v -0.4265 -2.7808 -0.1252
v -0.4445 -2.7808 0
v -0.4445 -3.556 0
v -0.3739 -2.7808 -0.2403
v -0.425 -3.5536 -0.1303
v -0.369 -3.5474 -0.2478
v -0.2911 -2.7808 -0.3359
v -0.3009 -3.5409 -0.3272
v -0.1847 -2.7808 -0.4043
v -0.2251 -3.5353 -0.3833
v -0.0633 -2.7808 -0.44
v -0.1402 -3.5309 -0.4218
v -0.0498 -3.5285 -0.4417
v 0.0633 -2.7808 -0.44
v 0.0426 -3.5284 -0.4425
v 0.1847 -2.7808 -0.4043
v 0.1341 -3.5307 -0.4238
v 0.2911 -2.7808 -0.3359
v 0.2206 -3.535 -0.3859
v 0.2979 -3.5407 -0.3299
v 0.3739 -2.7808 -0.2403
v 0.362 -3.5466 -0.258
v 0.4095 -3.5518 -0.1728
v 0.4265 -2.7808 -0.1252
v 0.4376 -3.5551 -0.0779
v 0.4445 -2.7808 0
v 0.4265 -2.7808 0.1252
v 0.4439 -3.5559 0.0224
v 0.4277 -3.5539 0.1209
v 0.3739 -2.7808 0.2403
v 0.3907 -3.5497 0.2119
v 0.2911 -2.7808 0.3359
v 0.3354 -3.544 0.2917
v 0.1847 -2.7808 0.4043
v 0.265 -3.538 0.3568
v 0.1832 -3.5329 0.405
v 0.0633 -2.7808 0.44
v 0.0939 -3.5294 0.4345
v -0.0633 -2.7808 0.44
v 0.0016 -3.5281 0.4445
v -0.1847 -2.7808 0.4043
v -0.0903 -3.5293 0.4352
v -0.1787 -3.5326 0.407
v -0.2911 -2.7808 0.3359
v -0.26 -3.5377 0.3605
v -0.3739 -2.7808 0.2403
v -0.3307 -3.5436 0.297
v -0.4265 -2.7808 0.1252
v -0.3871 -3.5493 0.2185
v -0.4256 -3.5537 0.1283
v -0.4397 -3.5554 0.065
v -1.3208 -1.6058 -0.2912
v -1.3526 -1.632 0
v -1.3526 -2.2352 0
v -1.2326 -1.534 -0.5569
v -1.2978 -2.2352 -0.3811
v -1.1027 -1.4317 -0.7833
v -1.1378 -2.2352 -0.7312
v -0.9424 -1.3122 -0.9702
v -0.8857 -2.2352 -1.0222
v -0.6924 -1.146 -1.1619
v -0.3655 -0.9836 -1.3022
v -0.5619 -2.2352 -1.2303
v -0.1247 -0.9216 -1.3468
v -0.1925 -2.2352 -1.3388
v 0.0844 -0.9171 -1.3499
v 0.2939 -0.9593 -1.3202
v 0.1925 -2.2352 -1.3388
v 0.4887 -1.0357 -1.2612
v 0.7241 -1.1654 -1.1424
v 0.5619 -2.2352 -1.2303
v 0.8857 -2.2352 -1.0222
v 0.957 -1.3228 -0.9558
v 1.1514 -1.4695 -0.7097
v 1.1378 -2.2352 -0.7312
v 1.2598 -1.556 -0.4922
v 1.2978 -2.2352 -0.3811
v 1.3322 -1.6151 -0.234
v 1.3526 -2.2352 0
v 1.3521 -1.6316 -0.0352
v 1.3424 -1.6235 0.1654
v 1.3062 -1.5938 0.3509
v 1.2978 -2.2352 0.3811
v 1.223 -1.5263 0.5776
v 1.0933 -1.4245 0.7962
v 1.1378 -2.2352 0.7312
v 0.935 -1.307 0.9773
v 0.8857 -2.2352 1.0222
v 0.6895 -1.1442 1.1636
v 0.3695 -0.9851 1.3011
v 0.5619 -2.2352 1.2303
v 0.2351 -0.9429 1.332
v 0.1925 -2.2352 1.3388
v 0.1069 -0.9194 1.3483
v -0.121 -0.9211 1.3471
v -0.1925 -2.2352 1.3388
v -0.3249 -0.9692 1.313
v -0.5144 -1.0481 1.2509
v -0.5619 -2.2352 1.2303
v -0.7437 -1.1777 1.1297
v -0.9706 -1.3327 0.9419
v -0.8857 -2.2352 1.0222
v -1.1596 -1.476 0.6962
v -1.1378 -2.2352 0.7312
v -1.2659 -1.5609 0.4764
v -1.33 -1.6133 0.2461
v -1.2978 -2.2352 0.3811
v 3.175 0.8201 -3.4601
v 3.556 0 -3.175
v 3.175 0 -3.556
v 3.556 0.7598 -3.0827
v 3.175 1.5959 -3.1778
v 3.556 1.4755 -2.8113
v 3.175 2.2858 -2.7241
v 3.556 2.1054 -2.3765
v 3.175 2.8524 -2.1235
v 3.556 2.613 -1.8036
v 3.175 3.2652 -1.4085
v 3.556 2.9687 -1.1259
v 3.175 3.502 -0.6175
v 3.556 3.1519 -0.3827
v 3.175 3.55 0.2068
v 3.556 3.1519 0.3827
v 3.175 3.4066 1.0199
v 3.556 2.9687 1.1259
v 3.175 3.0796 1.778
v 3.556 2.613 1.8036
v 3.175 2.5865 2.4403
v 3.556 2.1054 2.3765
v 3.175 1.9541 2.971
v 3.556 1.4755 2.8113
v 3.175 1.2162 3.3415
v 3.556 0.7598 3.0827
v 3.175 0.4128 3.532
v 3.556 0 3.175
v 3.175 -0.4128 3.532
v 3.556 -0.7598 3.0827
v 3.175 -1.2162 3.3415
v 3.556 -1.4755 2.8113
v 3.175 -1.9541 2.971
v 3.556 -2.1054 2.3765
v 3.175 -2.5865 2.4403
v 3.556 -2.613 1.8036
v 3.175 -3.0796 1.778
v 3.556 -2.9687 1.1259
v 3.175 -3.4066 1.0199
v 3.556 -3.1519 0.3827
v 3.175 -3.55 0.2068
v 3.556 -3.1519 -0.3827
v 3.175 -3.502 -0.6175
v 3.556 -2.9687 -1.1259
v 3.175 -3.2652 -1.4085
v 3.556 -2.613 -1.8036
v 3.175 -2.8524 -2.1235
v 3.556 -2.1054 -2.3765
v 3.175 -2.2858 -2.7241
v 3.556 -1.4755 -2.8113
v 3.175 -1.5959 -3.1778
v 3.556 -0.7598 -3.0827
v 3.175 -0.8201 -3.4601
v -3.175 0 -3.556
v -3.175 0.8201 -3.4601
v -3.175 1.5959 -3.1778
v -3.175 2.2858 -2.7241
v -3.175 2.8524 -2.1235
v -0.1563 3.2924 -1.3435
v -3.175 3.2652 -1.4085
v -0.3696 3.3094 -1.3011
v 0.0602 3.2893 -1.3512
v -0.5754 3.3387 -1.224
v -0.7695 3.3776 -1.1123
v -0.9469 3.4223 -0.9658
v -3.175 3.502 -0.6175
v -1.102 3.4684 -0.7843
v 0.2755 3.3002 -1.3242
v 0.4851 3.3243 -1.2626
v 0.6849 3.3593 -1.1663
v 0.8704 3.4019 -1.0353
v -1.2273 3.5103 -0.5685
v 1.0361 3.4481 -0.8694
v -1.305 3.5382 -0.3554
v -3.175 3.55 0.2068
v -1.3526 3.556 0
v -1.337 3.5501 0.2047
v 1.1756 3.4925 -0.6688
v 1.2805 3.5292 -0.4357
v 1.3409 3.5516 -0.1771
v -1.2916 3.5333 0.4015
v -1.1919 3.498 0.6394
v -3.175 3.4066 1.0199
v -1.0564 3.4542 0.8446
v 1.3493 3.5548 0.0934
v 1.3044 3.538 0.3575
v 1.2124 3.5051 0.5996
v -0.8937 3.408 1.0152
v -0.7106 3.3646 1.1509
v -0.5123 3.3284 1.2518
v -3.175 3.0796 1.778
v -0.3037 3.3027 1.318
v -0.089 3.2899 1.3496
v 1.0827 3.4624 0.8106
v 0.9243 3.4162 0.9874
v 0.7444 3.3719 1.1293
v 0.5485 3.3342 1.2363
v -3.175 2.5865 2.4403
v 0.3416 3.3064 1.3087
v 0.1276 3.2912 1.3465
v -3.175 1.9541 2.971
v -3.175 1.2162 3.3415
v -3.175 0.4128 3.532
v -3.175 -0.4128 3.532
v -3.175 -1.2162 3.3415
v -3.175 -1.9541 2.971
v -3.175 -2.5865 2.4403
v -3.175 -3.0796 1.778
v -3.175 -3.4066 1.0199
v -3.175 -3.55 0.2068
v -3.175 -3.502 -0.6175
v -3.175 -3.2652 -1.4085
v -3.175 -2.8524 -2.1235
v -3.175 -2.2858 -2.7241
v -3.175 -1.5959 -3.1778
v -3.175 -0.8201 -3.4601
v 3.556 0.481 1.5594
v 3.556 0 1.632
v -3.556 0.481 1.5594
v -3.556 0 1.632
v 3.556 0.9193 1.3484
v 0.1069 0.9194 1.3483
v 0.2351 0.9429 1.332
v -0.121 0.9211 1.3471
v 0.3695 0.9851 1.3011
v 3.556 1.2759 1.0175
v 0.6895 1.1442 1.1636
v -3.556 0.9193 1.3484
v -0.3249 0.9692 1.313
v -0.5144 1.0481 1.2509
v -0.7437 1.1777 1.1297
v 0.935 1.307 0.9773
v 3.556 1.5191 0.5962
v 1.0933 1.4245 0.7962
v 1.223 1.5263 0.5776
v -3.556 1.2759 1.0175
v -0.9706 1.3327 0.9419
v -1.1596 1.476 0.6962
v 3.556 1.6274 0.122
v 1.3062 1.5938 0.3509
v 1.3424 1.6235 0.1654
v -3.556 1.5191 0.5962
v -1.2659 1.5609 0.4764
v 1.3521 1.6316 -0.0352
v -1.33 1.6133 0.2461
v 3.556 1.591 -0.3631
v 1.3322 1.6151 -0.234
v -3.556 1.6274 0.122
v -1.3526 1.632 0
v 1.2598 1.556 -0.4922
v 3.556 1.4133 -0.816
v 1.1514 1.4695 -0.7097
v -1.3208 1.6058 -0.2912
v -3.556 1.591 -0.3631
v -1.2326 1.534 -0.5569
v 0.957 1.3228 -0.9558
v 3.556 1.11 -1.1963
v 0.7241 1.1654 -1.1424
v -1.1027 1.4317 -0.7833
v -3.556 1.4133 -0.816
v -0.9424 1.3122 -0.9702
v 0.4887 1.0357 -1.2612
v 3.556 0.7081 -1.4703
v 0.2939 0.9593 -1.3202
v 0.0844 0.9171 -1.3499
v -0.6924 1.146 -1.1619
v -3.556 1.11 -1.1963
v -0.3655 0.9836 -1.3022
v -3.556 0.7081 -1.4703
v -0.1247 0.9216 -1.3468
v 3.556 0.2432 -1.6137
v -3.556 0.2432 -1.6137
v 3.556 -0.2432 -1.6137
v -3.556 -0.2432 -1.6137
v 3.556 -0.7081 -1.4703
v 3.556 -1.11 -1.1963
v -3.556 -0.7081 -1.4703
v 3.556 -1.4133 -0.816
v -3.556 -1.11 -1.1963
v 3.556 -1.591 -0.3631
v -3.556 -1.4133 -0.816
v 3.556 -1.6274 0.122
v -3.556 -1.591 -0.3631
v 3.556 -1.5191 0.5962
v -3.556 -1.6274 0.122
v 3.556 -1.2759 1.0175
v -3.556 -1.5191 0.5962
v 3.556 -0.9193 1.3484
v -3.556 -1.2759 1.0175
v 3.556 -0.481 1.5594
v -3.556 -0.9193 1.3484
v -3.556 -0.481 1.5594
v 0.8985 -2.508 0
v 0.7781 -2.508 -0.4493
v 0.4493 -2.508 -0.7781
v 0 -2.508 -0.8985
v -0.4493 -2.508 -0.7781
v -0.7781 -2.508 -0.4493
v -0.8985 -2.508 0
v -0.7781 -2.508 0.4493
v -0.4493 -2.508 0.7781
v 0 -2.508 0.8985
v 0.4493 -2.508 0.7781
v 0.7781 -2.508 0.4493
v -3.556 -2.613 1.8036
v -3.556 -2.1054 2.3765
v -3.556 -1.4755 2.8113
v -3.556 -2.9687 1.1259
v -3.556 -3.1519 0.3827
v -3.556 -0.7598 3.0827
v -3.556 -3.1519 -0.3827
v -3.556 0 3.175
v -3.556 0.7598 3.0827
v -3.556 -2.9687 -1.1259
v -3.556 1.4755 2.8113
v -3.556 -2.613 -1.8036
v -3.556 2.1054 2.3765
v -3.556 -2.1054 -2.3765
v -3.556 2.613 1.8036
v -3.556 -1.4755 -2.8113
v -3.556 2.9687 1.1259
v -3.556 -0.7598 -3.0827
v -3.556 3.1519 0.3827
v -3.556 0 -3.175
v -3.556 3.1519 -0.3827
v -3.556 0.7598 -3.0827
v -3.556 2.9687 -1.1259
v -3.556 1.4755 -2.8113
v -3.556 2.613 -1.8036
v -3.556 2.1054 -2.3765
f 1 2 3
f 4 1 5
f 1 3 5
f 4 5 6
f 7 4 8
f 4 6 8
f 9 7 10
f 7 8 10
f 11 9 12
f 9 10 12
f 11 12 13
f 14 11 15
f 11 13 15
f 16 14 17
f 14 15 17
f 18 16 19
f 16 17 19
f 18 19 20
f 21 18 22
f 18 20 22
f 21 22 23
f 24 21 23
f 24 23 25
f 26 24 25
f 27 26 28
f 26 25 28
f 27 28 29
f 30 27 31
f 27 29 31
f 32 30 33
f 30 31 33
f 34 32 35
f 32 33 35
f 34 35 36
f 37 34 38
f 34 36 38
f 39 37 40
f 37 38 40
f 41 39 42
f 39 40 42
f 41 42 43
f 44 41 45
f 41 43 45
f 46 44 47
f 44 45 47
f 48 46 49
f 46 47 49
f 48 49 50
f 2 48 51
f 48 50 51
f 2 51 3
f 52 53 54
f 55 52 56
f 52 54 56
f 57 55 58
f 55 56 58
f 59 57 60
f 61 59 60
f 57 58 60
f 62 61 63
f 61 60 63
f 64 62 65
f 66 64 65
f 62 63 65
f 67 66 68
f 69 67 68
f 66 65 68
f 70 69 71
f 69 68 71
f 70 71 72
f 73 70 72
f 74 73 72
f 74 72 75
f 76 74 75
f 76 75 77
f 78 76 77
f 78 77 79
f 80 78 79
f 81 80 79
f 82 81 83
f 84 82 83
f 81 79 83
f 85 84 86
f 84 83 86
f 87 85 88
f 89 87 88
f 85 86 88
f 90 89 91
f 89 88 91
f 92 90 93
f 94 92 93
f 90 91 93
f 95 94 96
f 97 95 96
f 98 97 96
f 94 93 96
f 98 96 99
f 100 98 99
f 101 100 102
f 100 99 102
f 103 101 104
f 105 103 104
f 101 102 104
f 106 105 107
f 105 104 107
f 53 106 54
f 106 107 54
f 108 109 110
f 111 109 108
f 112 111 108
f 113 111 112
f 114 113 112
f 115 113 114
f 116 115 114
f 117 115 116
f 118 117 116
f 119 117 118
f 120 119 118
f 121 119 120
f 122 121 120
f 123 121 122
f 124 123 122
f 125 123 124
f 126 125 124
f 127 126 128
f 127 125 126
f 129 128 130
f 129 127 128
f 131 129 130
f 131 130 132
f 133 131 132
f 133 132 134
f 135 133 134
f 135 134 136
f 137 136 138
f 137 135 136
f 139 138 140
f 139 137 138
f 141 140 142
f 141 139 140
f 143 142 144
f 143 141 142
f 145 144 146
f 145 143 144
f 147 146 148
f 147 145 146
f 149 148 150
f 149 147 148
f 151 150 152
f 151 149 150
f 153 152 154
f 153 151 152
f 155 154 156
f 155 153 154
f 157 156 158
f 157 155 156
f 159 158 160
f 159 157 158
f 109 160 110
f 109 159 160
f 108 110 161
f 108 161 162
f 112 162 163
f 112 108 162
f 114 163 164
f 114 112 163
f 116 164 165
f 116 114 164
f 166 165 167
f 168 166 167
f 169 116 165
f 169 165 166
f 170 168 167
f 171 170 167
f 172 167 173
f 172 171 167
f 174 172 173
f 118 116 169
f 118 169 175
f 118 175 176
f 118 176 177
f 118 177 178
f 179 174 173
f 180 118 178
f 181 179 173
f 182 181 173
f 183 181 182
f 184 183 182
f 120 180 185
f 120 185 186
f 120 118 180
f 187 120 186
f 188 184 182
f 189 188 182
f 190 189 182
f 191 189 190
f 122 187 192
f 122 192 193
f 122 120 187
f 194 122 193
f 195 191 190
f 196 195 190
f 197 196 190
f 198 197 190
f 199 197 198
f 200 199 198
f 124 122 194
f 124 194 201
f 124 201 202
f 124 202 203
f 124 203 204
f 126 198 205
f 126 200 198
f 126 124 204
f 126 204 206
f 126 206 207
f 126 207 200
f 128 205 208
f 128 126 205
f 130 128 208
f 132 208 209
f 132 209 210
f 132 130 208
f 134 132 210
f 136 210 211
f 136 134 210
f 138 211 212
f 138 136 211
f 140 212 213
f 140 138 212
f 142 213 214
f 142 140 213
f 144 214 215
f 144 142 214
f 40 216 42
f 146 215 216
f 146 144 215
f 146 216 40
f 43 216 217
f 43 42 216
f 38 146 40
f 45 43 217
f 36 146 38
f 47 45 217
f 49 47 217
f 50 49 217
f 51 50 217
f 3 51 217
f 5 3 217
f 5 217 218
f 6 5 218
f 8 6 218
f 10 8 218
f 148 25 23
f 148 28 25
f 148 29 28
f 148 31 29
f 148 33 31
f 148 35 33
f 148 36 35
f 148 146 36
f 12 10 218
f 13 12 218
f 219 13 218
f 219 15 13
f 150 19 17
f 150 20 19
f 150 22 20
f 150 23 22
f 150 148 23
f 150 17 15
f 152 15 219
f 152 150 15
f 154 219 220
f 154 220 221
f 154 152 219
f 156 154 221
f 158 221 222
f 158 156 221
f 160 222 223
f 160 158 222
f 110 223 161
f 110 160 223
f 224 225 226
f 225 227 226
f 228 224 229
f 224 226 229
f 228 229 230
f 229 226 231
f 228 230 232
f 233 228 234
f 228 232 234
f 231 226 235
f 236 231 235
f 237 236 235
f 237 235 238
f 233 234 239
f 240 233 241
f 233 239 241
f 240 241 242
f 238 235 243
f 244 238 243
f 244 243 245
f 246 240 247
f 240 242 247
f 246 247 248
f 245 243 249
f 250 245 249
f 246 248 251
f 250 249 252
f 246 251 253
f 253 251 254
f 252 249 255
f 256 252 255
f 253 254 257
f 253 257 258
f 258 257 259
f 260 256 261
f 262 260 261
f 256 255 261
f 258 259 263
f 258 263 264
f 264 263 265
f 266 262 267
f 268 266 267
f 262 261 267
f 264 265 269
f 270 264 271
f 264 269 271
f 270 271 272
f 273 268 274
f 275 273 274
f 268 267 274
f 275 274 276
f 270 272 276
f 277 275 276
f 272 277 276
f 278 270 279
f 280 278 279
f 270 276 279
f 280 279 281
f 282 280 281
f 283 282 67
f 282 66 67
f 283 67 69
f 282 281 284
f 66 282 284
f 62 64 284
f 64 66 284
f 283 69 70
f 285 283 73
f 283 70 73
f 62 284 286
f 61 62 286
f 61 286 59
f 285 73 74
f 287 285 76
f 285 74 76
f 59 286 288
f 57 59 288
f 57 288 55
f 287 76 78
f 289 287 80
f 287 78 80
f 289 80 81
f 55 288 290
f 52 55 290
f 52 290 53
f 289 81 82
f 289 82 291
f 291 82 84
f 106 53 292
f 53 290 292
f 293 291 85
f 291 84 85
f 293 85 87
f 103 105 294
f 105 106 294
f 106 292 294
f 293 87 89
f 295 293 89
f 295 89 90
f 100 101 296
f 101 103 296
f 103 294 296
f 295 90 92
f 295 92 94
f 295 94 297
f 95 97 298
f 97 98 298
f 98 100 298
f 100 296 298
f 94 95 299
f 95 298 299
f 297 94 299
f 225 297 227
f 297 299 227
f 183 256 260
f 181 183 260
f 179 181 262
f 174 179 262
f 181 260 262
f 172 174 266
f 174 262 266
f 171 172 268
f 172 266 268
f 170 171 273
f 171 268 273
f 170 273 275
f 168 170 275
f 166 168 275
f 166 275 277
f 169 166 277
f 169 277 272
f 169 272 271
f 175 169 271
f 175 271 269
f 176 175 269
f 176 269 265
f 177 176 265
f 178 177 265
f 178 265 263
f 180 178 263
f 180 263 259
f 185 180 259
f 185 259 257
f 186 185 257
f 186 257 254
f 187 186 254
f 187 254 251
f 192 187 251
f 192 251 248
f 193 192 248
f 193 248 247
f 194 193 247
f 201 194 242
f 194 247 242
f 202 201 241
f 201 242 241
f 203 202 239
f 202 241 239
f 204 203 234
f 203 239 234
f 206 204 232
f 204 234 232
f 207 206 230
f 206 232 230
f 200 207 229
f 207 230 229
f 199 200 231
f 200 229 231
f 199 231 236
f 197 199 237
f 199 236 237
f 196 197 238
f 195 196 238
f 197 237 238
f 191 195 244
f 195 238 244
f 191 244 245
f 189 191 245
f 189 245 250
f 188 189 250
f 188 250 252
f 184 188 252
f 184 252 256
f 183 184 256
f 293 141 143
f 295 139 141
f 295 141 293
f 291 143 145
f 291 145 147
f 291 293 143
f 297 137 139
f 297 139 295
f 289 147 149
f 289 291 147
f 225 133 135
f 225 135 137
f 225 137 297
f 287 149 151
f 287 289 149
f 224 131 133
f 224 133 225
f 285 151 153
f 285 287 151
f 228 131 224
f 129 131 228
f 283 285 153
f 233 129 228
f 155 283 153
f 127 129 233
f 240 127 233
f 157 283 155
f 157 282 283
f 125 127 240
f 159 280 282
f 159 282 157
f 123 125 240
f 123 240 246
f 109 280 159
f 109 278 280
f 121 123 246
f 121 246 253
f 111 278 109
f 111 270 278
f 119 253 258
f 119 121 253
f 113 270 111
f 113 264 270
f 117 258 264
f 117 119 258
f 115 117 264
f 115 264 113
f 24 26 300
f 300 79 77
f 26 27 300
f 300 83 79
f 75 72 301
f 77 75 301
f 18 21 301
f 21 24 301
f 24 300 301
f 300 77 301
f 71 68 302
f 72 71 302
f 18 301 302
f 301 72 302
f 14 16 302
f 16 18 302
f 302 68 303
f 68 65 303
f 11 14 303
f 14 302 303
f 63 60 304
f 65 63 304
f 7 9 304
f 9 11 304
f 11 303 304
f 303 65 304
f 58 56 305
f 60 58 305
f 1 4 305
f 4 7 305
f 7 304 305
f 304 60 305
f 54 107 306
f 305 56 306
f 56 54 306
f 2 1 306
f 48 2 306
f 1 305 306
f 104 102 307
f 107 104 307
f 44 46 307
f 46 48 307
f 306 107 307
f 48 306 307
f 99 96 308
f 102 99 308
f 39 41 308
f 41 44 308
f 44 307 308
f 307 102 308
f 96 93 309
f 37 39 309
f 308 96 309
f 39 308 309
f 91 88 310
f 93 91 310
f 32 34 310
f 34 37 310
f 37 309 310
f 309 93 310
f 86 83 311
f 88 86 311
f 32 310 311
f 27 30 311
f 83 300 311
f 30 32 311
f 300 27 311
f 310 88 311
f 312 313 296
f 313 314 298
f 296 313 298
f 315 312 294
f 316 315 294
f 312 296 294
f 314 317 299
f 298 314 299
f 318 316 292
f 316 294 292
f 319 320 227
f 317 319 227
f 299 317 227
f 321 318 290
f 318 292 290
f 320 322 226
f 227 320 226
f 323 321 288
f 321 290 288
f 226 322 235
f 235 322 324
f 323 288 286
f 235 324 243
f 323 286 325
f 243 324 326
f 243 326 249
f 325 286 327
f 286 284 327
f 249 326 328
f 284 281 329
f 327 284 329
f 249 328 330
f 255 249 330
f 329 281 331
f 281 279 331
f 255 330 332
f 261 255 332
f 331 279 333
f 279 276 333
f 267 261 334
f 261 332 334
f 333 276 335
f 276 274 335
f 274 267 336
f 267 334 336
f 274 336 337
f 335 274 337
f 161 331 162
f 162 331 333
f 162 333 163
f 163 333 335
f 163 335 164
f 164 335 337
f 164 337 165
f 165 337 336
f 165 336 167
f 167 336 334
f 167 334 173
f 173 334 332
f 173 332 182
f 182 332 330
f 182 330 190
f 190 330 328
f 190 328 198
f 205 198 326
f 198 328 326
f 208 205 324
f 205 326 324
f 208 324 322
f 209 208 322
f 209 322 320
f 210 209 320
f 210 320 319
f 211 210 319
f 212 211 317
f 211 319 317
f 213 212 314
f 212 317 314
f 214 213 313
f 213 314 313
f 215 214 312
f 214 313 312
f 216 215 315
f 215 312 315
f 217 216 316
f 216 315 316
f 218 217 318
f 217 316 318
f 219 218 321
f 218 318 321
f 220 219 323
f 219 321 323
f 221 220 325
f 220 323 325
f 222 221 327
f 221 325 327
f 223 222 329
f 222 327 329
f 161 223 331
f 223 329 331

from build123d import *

# Parameters (mm, degrees)
SKETCH1_R                    = 3.556
BOSS_EXTRUDE1_DEPTH          = 3.556
F_30_0_1285_DIAMETER_HOLE1_D = 3.2639
CHAMFER2_SIZE                = 0.381
F_65_0_035_DIAMETER_HOLE2_D  = 0.889
F_6_32_TAPPED_HOLE1_D        = 2.7051
F_6_32_TAPPED_HOLE1_DEPTH    = 5.7912
F_6_32_TAPPED_HOLE1_TIP      = 0.81269403


with BuildPart() as part:
    # Sketch1 → Boss-Extrude1 (new, symmetric)
    with BuildSketch(Plane(origin=(0, 0, 0), x_dir=(0, 0, -1), z_dir=(1, 0, 0))):
        Circle(SKETCH1_R)
    extrude(amount=BOSS_EXTRUDE1_DEPTH, both=True)

    # #30 (0.1285) Diameter Hole1 (through all)
    with Locations(Plane(origin=(3.556, 0, 0), x_dir=(0, 0, -1), z_dir=(1, 0, 0))):
        with Locations((0, 0)):
            Hole(F_30_0_1285_DIAMETER_HOLE1_D / 2)

    # Chamfer2
    chamfer2_edges = [part.edges().sort_by_distance(p)[0] for p in [
        (-3.556, 0, 3.556),
        (3.556, 0, 3.556),
    ]]
    chamfer(chamfer2_edges, length=CHAMFER2_SIZE)

    # #65 (0.035) Diameter Hole2 (through all)
    with Locations(Plane(origin=(0, 3.556, 0), x_dir=(1, 0, 0), z_dir=(0, 1, 0))):
        with Locations((0, 0)):
            Hole(F_65_0_035_DIAMETER_HOLE2_D / 2)

    # #6-32 Tapped Hole1
    with Locations(Plane(origin=(0, 3.556, 0), x_dir=(1, 0, 0), z_dir=(0, 1, 0))):
        with Locations((0, 0)):
            Hole(F_6_32_TAPPED_HOLE1_D / 2, depth=F_6_32_TAPPED_HOLE1_DEPTH)
            with Locations((0, 0, -(F_6_32_TAPPED_HOLE1_DEPTH + F_6_32_TAPPED_HOLE1_TIP / 2))):  # 118° drill point
                Cone(0, F_6_32_TAPPED_HOLE1_D / 2, F_6_32_TAPPED_HOLE1_TIP, mode=Mode.SUBTRACT)


solid = part.part
